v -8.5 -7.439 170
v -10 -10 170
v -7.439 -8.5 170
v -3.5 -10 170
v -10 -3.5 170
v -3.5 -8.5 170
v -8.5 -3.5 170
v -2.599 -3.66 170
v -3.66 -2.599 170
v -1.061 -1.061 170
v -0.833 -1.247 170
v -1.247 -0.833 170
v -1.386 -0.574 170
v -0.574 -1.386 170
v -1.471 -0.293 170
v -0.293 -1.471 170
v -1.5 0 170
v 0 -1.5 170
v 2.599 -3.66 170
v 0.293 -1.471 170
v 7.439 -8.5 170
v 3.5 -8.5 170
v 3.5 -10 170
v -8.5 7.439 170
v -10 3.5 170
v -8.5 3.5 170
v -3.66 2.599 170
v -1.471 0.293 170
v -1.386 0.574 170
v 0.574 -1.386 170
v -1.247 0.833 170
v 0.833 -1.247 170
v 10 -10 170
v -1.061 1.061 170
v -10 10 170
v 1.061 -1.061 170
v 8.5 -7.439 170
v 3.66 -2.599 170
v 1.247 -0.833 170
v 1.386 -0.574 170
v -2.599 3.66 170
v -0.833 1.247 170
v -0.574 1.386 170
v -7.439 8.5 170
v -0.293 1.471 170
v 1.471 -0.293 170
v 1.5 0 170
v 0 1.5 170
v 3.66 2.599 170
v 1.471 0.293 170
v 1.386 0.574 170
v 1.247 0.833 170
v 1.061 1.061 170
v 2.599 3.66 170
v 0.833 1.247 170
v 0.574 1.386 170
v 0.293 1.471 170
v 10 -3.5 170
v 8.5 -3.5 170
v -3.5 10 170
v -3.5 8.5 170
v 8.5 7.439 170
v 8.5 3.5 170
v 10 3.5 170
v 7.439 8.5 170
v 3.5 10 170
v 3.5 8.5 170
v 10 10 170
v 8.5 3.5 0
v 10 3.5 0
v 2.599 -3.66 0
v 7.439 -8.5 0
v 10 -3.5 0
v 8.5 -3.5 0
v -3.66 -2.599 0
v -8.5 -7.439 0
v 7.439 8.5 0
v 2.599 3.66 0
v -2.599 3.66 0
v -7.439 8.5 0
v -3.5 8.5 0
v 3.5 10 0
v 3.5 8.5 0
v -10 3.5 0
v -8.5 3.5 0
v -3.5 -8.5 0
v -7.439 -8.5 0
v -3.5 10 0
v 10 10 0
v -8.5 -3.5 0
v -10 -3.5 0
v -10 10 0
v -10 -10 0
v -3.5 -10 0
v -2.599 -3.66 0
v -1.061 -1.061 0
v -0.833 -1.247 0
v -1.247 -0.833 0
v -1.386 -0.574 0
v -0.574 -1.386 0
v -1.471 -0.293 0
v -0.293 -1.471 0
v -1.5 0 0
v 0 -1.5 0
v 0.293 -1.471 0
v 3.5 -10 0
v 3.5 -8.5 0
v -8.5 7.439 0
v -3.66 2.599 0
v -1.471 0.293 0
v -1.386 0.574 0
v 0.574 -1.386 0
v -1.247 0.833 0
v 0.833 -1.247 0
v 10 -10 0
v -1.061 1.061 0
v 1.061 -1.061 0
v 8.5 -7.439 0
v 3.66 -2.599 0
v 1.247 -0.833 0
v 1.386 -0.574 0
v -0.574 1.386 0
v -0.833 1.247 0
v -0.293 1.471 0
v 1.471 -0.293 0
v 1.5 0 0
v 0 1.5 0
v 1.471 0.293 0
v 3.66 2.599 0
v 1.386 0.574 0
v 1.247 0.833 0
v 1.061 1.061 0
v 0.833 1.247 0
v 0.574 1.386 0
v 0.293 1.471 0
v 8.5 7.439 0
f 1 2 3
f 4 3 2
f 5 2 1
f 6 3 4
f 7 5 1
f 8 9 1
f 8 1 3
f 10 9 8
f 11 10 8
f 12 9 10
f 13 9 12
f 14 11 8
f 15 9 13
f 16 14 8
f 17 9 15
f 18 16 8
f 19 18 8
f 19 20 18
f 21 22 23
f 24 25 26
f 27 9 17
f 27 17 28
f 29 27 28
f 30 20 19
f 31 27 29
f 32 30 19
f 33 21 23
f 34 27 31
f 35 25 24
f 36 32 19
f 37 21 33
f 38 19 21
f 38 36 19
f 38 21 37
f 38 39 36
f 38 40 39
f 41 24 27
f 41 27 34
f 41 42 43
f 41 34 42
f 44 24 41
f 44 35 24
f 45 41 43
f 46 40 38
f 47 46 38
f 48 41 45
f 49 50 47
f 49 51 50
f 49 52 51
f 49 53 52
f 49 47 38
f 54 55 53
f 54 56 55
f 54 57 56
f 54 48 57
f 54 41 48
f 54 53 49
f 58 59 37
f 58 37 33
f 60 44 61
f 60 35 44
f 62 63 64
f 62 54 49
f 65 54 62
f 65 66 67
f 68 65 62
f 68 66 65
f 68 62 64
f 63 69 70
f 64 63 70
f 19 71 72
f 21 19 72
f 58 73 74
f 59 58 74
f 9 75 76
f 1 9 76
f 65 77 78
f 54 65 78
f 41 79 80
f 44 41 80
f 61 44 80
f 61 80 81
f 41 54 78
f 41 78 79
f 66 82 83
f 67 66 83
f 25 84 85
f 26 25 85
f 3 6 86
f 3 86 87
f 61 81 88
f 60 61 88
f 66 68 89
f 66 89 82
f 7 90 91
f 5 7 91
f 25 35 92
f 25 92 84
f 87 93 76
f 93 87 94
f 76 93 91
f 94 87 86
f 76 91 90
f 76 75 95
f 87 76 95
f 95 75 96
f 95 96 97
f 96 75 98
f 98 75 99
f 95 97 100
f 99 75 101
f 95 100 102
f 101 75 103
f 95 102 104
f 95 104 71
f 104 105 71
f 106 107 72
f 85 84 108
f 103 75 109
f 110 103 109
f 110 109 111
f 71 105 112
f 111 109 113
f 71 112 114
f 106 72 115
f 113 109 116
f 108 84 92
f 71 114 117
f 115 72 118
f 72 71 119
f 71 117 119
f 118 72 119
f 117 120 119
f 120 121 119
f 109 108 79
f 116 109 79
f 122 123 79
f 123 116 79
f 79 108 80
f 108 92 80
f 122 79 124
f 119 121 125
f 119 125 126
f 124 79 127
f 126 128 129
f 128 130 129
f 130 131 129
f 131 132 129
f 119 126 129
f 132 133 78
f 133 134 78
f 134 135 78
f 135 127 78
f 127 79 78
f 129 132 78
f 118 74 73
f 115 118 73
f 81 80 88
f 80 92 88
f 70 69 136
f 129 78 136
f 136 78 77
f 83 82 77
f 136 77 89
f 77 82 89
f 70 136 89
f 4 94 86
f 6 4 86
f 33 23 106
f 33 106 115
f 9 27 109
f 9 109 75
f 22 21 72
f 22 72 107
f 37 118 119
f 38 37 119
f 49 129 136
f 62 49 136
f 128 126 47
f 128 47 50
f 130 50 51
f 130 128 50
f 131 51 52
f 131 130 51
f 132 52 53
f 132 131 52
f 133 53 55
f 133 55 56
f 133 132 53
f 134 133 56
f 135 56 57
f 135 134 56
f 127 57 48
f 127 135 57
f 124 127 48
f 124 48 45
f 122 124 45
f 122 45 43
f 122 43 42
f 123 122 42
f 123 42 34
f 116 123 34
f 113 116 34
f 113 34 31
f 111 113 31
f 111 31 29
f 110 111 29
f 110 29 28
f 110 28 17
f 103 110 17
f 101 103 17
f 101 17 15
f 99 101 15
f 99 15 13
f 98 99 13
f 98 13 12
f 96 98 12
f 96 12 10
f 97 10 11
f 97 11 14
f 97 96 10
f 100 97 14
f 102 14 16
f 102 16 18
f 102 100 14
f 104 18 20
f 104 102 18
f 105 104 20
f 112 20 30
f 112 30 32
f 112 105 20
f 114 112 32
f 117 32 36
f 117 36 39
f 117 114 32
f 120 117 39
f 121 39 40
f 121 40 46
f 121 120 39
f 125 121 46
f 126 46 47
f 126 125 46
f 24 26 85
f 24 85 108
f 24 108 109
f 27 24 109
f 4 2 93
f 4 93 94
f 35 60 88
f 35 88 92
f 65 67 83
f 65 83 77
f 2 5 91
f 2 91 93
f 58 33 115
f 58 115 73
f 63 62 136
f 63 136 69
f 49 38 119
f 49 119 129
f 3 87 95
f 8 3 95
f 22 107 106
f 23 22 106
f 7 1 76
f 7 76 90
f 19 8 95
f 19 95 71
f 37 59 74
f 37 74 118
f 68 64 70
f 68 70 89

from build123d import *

# Parameters (mm, degrees)
F0_R            = 1.5
F1_DEPTH        = 170
F1_COPIES_COUNT = 4


# Not quite as in the source:
# - a pattern or mirror of a feature is missing from the dataset's text; its kind, count and spacing are read off the source's solid
# - a feature names something its author has since deleted; it is built from what else it names


with BuildPart() as f1:
    # F0 (on Top) → F1 (new body)
    with BuildSketch(Plane.XY):
        Polygon((-3.66, -3.66), (3.66, -3.66), (3.66, 3.66), (-2.5993398282, 3.66), (-3.66, 2.5993398282), align=None)
        Circle(F0_R, mode=Mode.SUBTRACT)
        Polygon((-8.5, 7.4393398282), (-3.66, 2.5993398282), (-2.5993398282, 3.66), (-7.4393398282, 8.5), (-3.5, 8.5), (-3.5, 10), (-10, 10), (-10, 3.5), (-8.5, 3.5), align=None)
    extrude(amount=F1_DEPTH)

    # F1_copies: F1 ×4 about axis
    f1_copies_axis = Axis((0, 0, 0), (0, 0, 1))


with BuildPart() as f1_1:
    add(f1.part)
    for i in range(1, F1_COPIES_COUNT):
        add(f1.part.rotate(f1_copies_axis, i * 360 / F1_COPIES_COUNT))


solid = f1_1.part
